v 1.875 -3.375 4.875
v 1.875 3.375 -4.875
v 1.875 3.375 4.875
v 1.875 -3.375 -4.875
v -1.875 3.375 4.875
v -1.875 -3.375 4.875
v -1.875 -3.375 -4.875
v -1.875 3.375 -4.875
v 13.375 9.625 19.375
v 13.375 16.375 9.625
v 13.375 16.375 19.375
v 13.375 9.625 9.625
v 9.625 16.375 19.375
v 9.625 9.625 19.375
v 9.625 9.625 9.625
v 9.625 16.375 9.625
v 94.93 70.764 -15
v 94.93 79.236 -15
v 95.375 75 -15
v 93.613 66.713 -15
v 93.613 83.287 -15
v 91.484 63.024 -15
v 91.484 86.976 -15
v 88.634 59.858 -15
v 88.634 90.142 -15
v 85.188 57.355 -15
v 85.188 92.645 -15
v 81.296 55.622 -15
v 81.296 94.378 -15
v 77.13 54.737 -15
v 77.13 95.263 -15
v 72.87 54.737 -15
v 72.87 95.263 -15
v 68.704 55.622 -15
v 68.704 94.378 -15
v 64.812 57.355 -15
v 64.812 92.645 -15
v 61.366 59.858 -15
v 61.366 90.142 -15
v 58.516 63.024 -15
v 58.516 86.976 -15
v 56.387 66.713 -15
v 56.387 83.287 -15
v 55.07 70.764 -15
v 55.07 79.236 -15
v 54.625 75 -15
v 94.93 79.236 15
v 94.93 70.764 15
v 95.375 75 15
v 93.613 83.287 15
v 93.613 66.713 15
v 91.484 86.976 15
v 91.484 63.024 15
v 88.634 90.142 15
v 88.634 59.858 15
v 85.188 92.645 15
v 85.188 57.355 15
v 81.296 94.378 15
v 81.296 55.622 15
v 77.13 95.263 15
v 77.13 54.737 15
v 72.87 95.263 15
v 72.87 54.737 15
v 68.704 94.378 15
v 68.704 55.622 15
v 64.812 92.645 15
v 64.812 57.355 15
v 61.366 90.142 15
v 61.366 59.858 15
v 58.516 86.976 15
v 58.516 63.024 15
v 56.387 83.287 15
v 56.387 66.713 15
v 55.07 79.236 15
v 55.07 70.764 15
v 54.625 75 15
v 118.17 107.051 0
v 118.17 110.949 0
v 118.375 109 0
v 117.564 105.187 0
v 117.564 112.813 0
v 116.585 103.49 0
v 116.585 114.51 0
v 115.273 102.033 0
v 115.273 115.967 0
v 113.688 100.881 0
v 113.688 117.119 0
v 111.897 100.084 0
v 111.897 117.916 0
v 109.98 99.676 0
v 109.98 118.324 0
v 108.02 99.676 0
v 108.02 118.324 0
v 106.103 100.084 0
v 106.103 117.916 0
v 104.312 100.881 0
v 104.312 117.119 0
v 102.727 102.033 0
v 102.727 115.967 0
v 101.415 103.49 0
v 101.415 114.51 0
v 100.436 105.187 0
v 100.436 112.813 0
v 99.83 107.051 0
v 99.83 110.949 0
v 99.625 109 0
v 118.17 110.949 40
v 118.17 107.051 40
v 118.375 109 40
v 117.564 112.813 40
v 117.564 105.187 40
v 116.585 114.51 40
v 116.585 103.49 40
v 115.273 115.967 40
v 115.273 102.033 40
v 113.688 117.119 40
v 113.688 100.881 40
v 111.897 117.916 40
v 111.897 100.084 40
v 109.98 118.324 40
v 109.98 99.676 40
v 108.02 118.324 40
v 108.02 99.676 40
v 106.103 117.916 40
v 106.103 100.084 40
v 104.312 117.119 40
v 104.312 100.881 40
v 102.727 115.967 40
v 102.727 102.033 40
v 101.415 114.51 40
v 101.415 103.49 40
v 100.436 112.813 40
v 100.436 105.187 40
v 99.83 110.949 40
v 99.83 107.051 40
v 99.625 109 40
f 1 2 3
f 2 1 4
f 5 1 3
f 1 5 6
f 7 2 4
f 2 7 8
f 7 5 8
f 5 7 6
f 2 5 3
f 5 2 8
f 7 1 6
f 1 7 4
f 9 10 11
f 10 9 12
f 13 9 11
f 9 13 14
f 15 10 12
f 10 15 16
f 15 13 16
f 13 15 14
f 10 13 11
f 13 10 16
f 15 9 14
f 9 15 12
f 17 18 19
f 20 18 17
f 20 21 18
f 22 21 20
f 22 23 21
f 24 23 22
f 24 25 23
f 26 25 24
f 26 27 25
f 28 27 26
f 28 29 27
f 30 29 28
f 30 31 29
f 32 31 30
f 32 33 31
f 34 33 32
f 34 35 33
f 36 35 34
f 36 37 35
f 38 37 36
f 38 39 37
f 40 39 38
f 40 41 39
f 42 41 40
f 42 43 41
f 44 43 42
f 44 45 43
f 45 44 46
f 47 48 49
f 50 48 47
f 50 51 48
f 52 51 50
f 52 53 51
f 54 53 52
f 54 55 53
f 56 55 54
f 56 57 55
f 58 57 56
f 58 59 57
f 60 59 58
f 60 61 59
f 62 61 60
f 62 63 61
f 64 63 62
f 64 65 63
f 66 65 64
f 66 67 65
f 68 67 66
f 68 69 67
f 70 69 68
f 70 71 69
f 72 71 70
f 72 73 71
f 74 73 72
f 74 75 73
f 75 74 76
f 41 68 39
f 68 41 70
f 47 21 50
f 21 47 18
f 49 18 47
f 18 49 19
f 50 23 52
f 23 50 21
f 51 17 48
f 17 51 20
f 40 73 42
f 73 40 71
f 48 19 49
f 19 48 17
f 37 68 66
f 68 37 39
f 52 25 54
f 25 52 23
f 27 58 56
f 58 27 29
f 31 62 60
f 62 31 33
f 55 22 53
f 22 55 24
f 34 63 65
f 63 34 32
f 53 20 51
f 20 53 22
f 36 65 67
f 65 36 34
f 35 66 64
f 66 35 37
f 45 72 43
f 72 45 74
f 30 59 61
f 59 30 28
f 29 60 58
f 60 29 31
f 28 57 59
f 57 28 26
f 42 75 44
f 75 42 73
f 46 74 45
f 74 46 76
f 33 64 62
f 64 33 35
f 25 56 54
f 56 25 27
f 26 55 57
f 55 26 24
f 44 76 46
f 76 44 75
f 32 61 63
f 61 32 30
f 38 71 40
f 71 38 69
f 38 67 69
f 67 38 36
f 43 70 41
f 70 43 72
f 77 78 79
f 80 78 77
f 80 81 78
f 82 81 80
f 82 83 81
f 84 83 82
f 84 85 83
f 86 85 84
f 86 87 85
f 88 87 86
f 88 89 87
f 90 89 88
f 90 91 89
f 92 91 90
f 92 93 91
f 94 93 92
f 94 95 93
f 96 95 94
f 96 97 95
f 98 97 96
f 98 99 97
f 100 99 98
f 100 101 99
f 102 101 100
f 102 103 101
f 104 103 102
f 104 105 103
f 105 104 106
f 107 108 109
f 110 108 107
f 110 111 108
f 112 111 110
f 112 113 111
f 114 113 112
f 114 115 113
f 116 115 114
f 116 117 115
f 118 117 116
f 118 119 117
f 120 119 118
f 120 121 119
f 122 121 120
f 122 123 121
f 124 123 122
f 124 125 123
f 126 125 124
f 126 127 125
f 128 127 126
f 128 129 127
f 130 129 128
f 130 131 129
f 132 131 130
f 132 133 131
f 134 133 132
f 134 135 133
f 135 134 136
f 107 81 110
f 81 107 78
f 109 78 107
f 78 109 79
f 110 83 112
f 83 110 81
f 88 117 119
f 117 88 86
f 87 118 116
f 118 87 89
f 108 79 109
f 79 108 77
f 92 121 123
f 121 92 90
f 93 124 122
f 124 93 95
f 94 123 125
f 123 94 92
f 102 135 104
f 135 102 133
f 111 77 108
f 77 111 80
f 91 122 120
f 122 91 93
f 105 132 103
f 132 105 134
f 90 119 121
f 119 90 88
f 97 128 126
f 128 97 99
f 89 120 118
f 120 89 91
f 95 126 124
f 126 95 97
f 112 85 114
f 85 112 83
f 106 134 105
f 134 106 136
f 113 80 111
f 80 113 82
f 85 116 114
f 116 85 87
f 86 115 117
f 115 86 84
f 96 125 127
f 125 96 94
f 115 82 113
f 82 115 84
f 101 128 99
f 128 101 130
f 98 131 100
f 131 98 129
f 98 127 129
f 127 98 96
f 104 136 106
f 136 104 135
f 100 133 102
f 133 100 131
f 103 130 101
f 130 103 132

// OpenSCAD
abs_tweek = .75;


module CYLINDER(height=1,radius=1, center = true)
{
    if (center == true)
    {
        color("RED")
        cylinder(h = height, r = radius, center = true);
 
        color("VIOLET", .2)
        cylinder(h = height, r = radius + abs_tweek/2, center = true);
    }
    else
    {
        color("RED")
        translate([radius, radius, 0])
        cylinder(h = height, r = radius, center = false);

        color("VIOLET", .2)
        translate([radius, radius, 0])
        cylinder(h = height, r = radius + abs_tweek/2, center = false);
    }
}


module CUBE(size, center = true)
{
    cube(size + abs_tweek_mm, center);
}

module CUBE(dimension = [0 , 0, 0], center = true)
{
    if (center == true)
    {
        // the true size
        color("GREEN", 1)
        cube([dimension[0], dimension[1], dimension[2]], center);

        // the adjusted size
        color("BLUE", .2)
        cube([dimension[0] + abs_tweek, dimension[1] + abs_tweek, dimension[2] + abs_tweek], center);
    }
    else
    {
        // the true size
        color("GREEN", 1)
        cube([dimension[0], dimension[1], dimension[2] ], center = false);

        // the adjusted size
        color("BLUE", .2)
        translate([-abs_tweek/2, -abs_tweek/2, -abs_tweek/2])
        cube([dimension[0] + abs_tweek, dimension[1] + abs_tweek, dimension[2] + abs_tweek], center = false);
    }
}


//CUBE(10, center = false);

CUBE(dimension=[3,6,9], center = true);
translate([ 10,10,10])
CUBE([3,6,9], center = false);

translate([75,75,0])
CYLINDER(height=30, radius=20, center=true);

translate([100,100,0])
CYLINDER(height=40, radius=9, center=false);
